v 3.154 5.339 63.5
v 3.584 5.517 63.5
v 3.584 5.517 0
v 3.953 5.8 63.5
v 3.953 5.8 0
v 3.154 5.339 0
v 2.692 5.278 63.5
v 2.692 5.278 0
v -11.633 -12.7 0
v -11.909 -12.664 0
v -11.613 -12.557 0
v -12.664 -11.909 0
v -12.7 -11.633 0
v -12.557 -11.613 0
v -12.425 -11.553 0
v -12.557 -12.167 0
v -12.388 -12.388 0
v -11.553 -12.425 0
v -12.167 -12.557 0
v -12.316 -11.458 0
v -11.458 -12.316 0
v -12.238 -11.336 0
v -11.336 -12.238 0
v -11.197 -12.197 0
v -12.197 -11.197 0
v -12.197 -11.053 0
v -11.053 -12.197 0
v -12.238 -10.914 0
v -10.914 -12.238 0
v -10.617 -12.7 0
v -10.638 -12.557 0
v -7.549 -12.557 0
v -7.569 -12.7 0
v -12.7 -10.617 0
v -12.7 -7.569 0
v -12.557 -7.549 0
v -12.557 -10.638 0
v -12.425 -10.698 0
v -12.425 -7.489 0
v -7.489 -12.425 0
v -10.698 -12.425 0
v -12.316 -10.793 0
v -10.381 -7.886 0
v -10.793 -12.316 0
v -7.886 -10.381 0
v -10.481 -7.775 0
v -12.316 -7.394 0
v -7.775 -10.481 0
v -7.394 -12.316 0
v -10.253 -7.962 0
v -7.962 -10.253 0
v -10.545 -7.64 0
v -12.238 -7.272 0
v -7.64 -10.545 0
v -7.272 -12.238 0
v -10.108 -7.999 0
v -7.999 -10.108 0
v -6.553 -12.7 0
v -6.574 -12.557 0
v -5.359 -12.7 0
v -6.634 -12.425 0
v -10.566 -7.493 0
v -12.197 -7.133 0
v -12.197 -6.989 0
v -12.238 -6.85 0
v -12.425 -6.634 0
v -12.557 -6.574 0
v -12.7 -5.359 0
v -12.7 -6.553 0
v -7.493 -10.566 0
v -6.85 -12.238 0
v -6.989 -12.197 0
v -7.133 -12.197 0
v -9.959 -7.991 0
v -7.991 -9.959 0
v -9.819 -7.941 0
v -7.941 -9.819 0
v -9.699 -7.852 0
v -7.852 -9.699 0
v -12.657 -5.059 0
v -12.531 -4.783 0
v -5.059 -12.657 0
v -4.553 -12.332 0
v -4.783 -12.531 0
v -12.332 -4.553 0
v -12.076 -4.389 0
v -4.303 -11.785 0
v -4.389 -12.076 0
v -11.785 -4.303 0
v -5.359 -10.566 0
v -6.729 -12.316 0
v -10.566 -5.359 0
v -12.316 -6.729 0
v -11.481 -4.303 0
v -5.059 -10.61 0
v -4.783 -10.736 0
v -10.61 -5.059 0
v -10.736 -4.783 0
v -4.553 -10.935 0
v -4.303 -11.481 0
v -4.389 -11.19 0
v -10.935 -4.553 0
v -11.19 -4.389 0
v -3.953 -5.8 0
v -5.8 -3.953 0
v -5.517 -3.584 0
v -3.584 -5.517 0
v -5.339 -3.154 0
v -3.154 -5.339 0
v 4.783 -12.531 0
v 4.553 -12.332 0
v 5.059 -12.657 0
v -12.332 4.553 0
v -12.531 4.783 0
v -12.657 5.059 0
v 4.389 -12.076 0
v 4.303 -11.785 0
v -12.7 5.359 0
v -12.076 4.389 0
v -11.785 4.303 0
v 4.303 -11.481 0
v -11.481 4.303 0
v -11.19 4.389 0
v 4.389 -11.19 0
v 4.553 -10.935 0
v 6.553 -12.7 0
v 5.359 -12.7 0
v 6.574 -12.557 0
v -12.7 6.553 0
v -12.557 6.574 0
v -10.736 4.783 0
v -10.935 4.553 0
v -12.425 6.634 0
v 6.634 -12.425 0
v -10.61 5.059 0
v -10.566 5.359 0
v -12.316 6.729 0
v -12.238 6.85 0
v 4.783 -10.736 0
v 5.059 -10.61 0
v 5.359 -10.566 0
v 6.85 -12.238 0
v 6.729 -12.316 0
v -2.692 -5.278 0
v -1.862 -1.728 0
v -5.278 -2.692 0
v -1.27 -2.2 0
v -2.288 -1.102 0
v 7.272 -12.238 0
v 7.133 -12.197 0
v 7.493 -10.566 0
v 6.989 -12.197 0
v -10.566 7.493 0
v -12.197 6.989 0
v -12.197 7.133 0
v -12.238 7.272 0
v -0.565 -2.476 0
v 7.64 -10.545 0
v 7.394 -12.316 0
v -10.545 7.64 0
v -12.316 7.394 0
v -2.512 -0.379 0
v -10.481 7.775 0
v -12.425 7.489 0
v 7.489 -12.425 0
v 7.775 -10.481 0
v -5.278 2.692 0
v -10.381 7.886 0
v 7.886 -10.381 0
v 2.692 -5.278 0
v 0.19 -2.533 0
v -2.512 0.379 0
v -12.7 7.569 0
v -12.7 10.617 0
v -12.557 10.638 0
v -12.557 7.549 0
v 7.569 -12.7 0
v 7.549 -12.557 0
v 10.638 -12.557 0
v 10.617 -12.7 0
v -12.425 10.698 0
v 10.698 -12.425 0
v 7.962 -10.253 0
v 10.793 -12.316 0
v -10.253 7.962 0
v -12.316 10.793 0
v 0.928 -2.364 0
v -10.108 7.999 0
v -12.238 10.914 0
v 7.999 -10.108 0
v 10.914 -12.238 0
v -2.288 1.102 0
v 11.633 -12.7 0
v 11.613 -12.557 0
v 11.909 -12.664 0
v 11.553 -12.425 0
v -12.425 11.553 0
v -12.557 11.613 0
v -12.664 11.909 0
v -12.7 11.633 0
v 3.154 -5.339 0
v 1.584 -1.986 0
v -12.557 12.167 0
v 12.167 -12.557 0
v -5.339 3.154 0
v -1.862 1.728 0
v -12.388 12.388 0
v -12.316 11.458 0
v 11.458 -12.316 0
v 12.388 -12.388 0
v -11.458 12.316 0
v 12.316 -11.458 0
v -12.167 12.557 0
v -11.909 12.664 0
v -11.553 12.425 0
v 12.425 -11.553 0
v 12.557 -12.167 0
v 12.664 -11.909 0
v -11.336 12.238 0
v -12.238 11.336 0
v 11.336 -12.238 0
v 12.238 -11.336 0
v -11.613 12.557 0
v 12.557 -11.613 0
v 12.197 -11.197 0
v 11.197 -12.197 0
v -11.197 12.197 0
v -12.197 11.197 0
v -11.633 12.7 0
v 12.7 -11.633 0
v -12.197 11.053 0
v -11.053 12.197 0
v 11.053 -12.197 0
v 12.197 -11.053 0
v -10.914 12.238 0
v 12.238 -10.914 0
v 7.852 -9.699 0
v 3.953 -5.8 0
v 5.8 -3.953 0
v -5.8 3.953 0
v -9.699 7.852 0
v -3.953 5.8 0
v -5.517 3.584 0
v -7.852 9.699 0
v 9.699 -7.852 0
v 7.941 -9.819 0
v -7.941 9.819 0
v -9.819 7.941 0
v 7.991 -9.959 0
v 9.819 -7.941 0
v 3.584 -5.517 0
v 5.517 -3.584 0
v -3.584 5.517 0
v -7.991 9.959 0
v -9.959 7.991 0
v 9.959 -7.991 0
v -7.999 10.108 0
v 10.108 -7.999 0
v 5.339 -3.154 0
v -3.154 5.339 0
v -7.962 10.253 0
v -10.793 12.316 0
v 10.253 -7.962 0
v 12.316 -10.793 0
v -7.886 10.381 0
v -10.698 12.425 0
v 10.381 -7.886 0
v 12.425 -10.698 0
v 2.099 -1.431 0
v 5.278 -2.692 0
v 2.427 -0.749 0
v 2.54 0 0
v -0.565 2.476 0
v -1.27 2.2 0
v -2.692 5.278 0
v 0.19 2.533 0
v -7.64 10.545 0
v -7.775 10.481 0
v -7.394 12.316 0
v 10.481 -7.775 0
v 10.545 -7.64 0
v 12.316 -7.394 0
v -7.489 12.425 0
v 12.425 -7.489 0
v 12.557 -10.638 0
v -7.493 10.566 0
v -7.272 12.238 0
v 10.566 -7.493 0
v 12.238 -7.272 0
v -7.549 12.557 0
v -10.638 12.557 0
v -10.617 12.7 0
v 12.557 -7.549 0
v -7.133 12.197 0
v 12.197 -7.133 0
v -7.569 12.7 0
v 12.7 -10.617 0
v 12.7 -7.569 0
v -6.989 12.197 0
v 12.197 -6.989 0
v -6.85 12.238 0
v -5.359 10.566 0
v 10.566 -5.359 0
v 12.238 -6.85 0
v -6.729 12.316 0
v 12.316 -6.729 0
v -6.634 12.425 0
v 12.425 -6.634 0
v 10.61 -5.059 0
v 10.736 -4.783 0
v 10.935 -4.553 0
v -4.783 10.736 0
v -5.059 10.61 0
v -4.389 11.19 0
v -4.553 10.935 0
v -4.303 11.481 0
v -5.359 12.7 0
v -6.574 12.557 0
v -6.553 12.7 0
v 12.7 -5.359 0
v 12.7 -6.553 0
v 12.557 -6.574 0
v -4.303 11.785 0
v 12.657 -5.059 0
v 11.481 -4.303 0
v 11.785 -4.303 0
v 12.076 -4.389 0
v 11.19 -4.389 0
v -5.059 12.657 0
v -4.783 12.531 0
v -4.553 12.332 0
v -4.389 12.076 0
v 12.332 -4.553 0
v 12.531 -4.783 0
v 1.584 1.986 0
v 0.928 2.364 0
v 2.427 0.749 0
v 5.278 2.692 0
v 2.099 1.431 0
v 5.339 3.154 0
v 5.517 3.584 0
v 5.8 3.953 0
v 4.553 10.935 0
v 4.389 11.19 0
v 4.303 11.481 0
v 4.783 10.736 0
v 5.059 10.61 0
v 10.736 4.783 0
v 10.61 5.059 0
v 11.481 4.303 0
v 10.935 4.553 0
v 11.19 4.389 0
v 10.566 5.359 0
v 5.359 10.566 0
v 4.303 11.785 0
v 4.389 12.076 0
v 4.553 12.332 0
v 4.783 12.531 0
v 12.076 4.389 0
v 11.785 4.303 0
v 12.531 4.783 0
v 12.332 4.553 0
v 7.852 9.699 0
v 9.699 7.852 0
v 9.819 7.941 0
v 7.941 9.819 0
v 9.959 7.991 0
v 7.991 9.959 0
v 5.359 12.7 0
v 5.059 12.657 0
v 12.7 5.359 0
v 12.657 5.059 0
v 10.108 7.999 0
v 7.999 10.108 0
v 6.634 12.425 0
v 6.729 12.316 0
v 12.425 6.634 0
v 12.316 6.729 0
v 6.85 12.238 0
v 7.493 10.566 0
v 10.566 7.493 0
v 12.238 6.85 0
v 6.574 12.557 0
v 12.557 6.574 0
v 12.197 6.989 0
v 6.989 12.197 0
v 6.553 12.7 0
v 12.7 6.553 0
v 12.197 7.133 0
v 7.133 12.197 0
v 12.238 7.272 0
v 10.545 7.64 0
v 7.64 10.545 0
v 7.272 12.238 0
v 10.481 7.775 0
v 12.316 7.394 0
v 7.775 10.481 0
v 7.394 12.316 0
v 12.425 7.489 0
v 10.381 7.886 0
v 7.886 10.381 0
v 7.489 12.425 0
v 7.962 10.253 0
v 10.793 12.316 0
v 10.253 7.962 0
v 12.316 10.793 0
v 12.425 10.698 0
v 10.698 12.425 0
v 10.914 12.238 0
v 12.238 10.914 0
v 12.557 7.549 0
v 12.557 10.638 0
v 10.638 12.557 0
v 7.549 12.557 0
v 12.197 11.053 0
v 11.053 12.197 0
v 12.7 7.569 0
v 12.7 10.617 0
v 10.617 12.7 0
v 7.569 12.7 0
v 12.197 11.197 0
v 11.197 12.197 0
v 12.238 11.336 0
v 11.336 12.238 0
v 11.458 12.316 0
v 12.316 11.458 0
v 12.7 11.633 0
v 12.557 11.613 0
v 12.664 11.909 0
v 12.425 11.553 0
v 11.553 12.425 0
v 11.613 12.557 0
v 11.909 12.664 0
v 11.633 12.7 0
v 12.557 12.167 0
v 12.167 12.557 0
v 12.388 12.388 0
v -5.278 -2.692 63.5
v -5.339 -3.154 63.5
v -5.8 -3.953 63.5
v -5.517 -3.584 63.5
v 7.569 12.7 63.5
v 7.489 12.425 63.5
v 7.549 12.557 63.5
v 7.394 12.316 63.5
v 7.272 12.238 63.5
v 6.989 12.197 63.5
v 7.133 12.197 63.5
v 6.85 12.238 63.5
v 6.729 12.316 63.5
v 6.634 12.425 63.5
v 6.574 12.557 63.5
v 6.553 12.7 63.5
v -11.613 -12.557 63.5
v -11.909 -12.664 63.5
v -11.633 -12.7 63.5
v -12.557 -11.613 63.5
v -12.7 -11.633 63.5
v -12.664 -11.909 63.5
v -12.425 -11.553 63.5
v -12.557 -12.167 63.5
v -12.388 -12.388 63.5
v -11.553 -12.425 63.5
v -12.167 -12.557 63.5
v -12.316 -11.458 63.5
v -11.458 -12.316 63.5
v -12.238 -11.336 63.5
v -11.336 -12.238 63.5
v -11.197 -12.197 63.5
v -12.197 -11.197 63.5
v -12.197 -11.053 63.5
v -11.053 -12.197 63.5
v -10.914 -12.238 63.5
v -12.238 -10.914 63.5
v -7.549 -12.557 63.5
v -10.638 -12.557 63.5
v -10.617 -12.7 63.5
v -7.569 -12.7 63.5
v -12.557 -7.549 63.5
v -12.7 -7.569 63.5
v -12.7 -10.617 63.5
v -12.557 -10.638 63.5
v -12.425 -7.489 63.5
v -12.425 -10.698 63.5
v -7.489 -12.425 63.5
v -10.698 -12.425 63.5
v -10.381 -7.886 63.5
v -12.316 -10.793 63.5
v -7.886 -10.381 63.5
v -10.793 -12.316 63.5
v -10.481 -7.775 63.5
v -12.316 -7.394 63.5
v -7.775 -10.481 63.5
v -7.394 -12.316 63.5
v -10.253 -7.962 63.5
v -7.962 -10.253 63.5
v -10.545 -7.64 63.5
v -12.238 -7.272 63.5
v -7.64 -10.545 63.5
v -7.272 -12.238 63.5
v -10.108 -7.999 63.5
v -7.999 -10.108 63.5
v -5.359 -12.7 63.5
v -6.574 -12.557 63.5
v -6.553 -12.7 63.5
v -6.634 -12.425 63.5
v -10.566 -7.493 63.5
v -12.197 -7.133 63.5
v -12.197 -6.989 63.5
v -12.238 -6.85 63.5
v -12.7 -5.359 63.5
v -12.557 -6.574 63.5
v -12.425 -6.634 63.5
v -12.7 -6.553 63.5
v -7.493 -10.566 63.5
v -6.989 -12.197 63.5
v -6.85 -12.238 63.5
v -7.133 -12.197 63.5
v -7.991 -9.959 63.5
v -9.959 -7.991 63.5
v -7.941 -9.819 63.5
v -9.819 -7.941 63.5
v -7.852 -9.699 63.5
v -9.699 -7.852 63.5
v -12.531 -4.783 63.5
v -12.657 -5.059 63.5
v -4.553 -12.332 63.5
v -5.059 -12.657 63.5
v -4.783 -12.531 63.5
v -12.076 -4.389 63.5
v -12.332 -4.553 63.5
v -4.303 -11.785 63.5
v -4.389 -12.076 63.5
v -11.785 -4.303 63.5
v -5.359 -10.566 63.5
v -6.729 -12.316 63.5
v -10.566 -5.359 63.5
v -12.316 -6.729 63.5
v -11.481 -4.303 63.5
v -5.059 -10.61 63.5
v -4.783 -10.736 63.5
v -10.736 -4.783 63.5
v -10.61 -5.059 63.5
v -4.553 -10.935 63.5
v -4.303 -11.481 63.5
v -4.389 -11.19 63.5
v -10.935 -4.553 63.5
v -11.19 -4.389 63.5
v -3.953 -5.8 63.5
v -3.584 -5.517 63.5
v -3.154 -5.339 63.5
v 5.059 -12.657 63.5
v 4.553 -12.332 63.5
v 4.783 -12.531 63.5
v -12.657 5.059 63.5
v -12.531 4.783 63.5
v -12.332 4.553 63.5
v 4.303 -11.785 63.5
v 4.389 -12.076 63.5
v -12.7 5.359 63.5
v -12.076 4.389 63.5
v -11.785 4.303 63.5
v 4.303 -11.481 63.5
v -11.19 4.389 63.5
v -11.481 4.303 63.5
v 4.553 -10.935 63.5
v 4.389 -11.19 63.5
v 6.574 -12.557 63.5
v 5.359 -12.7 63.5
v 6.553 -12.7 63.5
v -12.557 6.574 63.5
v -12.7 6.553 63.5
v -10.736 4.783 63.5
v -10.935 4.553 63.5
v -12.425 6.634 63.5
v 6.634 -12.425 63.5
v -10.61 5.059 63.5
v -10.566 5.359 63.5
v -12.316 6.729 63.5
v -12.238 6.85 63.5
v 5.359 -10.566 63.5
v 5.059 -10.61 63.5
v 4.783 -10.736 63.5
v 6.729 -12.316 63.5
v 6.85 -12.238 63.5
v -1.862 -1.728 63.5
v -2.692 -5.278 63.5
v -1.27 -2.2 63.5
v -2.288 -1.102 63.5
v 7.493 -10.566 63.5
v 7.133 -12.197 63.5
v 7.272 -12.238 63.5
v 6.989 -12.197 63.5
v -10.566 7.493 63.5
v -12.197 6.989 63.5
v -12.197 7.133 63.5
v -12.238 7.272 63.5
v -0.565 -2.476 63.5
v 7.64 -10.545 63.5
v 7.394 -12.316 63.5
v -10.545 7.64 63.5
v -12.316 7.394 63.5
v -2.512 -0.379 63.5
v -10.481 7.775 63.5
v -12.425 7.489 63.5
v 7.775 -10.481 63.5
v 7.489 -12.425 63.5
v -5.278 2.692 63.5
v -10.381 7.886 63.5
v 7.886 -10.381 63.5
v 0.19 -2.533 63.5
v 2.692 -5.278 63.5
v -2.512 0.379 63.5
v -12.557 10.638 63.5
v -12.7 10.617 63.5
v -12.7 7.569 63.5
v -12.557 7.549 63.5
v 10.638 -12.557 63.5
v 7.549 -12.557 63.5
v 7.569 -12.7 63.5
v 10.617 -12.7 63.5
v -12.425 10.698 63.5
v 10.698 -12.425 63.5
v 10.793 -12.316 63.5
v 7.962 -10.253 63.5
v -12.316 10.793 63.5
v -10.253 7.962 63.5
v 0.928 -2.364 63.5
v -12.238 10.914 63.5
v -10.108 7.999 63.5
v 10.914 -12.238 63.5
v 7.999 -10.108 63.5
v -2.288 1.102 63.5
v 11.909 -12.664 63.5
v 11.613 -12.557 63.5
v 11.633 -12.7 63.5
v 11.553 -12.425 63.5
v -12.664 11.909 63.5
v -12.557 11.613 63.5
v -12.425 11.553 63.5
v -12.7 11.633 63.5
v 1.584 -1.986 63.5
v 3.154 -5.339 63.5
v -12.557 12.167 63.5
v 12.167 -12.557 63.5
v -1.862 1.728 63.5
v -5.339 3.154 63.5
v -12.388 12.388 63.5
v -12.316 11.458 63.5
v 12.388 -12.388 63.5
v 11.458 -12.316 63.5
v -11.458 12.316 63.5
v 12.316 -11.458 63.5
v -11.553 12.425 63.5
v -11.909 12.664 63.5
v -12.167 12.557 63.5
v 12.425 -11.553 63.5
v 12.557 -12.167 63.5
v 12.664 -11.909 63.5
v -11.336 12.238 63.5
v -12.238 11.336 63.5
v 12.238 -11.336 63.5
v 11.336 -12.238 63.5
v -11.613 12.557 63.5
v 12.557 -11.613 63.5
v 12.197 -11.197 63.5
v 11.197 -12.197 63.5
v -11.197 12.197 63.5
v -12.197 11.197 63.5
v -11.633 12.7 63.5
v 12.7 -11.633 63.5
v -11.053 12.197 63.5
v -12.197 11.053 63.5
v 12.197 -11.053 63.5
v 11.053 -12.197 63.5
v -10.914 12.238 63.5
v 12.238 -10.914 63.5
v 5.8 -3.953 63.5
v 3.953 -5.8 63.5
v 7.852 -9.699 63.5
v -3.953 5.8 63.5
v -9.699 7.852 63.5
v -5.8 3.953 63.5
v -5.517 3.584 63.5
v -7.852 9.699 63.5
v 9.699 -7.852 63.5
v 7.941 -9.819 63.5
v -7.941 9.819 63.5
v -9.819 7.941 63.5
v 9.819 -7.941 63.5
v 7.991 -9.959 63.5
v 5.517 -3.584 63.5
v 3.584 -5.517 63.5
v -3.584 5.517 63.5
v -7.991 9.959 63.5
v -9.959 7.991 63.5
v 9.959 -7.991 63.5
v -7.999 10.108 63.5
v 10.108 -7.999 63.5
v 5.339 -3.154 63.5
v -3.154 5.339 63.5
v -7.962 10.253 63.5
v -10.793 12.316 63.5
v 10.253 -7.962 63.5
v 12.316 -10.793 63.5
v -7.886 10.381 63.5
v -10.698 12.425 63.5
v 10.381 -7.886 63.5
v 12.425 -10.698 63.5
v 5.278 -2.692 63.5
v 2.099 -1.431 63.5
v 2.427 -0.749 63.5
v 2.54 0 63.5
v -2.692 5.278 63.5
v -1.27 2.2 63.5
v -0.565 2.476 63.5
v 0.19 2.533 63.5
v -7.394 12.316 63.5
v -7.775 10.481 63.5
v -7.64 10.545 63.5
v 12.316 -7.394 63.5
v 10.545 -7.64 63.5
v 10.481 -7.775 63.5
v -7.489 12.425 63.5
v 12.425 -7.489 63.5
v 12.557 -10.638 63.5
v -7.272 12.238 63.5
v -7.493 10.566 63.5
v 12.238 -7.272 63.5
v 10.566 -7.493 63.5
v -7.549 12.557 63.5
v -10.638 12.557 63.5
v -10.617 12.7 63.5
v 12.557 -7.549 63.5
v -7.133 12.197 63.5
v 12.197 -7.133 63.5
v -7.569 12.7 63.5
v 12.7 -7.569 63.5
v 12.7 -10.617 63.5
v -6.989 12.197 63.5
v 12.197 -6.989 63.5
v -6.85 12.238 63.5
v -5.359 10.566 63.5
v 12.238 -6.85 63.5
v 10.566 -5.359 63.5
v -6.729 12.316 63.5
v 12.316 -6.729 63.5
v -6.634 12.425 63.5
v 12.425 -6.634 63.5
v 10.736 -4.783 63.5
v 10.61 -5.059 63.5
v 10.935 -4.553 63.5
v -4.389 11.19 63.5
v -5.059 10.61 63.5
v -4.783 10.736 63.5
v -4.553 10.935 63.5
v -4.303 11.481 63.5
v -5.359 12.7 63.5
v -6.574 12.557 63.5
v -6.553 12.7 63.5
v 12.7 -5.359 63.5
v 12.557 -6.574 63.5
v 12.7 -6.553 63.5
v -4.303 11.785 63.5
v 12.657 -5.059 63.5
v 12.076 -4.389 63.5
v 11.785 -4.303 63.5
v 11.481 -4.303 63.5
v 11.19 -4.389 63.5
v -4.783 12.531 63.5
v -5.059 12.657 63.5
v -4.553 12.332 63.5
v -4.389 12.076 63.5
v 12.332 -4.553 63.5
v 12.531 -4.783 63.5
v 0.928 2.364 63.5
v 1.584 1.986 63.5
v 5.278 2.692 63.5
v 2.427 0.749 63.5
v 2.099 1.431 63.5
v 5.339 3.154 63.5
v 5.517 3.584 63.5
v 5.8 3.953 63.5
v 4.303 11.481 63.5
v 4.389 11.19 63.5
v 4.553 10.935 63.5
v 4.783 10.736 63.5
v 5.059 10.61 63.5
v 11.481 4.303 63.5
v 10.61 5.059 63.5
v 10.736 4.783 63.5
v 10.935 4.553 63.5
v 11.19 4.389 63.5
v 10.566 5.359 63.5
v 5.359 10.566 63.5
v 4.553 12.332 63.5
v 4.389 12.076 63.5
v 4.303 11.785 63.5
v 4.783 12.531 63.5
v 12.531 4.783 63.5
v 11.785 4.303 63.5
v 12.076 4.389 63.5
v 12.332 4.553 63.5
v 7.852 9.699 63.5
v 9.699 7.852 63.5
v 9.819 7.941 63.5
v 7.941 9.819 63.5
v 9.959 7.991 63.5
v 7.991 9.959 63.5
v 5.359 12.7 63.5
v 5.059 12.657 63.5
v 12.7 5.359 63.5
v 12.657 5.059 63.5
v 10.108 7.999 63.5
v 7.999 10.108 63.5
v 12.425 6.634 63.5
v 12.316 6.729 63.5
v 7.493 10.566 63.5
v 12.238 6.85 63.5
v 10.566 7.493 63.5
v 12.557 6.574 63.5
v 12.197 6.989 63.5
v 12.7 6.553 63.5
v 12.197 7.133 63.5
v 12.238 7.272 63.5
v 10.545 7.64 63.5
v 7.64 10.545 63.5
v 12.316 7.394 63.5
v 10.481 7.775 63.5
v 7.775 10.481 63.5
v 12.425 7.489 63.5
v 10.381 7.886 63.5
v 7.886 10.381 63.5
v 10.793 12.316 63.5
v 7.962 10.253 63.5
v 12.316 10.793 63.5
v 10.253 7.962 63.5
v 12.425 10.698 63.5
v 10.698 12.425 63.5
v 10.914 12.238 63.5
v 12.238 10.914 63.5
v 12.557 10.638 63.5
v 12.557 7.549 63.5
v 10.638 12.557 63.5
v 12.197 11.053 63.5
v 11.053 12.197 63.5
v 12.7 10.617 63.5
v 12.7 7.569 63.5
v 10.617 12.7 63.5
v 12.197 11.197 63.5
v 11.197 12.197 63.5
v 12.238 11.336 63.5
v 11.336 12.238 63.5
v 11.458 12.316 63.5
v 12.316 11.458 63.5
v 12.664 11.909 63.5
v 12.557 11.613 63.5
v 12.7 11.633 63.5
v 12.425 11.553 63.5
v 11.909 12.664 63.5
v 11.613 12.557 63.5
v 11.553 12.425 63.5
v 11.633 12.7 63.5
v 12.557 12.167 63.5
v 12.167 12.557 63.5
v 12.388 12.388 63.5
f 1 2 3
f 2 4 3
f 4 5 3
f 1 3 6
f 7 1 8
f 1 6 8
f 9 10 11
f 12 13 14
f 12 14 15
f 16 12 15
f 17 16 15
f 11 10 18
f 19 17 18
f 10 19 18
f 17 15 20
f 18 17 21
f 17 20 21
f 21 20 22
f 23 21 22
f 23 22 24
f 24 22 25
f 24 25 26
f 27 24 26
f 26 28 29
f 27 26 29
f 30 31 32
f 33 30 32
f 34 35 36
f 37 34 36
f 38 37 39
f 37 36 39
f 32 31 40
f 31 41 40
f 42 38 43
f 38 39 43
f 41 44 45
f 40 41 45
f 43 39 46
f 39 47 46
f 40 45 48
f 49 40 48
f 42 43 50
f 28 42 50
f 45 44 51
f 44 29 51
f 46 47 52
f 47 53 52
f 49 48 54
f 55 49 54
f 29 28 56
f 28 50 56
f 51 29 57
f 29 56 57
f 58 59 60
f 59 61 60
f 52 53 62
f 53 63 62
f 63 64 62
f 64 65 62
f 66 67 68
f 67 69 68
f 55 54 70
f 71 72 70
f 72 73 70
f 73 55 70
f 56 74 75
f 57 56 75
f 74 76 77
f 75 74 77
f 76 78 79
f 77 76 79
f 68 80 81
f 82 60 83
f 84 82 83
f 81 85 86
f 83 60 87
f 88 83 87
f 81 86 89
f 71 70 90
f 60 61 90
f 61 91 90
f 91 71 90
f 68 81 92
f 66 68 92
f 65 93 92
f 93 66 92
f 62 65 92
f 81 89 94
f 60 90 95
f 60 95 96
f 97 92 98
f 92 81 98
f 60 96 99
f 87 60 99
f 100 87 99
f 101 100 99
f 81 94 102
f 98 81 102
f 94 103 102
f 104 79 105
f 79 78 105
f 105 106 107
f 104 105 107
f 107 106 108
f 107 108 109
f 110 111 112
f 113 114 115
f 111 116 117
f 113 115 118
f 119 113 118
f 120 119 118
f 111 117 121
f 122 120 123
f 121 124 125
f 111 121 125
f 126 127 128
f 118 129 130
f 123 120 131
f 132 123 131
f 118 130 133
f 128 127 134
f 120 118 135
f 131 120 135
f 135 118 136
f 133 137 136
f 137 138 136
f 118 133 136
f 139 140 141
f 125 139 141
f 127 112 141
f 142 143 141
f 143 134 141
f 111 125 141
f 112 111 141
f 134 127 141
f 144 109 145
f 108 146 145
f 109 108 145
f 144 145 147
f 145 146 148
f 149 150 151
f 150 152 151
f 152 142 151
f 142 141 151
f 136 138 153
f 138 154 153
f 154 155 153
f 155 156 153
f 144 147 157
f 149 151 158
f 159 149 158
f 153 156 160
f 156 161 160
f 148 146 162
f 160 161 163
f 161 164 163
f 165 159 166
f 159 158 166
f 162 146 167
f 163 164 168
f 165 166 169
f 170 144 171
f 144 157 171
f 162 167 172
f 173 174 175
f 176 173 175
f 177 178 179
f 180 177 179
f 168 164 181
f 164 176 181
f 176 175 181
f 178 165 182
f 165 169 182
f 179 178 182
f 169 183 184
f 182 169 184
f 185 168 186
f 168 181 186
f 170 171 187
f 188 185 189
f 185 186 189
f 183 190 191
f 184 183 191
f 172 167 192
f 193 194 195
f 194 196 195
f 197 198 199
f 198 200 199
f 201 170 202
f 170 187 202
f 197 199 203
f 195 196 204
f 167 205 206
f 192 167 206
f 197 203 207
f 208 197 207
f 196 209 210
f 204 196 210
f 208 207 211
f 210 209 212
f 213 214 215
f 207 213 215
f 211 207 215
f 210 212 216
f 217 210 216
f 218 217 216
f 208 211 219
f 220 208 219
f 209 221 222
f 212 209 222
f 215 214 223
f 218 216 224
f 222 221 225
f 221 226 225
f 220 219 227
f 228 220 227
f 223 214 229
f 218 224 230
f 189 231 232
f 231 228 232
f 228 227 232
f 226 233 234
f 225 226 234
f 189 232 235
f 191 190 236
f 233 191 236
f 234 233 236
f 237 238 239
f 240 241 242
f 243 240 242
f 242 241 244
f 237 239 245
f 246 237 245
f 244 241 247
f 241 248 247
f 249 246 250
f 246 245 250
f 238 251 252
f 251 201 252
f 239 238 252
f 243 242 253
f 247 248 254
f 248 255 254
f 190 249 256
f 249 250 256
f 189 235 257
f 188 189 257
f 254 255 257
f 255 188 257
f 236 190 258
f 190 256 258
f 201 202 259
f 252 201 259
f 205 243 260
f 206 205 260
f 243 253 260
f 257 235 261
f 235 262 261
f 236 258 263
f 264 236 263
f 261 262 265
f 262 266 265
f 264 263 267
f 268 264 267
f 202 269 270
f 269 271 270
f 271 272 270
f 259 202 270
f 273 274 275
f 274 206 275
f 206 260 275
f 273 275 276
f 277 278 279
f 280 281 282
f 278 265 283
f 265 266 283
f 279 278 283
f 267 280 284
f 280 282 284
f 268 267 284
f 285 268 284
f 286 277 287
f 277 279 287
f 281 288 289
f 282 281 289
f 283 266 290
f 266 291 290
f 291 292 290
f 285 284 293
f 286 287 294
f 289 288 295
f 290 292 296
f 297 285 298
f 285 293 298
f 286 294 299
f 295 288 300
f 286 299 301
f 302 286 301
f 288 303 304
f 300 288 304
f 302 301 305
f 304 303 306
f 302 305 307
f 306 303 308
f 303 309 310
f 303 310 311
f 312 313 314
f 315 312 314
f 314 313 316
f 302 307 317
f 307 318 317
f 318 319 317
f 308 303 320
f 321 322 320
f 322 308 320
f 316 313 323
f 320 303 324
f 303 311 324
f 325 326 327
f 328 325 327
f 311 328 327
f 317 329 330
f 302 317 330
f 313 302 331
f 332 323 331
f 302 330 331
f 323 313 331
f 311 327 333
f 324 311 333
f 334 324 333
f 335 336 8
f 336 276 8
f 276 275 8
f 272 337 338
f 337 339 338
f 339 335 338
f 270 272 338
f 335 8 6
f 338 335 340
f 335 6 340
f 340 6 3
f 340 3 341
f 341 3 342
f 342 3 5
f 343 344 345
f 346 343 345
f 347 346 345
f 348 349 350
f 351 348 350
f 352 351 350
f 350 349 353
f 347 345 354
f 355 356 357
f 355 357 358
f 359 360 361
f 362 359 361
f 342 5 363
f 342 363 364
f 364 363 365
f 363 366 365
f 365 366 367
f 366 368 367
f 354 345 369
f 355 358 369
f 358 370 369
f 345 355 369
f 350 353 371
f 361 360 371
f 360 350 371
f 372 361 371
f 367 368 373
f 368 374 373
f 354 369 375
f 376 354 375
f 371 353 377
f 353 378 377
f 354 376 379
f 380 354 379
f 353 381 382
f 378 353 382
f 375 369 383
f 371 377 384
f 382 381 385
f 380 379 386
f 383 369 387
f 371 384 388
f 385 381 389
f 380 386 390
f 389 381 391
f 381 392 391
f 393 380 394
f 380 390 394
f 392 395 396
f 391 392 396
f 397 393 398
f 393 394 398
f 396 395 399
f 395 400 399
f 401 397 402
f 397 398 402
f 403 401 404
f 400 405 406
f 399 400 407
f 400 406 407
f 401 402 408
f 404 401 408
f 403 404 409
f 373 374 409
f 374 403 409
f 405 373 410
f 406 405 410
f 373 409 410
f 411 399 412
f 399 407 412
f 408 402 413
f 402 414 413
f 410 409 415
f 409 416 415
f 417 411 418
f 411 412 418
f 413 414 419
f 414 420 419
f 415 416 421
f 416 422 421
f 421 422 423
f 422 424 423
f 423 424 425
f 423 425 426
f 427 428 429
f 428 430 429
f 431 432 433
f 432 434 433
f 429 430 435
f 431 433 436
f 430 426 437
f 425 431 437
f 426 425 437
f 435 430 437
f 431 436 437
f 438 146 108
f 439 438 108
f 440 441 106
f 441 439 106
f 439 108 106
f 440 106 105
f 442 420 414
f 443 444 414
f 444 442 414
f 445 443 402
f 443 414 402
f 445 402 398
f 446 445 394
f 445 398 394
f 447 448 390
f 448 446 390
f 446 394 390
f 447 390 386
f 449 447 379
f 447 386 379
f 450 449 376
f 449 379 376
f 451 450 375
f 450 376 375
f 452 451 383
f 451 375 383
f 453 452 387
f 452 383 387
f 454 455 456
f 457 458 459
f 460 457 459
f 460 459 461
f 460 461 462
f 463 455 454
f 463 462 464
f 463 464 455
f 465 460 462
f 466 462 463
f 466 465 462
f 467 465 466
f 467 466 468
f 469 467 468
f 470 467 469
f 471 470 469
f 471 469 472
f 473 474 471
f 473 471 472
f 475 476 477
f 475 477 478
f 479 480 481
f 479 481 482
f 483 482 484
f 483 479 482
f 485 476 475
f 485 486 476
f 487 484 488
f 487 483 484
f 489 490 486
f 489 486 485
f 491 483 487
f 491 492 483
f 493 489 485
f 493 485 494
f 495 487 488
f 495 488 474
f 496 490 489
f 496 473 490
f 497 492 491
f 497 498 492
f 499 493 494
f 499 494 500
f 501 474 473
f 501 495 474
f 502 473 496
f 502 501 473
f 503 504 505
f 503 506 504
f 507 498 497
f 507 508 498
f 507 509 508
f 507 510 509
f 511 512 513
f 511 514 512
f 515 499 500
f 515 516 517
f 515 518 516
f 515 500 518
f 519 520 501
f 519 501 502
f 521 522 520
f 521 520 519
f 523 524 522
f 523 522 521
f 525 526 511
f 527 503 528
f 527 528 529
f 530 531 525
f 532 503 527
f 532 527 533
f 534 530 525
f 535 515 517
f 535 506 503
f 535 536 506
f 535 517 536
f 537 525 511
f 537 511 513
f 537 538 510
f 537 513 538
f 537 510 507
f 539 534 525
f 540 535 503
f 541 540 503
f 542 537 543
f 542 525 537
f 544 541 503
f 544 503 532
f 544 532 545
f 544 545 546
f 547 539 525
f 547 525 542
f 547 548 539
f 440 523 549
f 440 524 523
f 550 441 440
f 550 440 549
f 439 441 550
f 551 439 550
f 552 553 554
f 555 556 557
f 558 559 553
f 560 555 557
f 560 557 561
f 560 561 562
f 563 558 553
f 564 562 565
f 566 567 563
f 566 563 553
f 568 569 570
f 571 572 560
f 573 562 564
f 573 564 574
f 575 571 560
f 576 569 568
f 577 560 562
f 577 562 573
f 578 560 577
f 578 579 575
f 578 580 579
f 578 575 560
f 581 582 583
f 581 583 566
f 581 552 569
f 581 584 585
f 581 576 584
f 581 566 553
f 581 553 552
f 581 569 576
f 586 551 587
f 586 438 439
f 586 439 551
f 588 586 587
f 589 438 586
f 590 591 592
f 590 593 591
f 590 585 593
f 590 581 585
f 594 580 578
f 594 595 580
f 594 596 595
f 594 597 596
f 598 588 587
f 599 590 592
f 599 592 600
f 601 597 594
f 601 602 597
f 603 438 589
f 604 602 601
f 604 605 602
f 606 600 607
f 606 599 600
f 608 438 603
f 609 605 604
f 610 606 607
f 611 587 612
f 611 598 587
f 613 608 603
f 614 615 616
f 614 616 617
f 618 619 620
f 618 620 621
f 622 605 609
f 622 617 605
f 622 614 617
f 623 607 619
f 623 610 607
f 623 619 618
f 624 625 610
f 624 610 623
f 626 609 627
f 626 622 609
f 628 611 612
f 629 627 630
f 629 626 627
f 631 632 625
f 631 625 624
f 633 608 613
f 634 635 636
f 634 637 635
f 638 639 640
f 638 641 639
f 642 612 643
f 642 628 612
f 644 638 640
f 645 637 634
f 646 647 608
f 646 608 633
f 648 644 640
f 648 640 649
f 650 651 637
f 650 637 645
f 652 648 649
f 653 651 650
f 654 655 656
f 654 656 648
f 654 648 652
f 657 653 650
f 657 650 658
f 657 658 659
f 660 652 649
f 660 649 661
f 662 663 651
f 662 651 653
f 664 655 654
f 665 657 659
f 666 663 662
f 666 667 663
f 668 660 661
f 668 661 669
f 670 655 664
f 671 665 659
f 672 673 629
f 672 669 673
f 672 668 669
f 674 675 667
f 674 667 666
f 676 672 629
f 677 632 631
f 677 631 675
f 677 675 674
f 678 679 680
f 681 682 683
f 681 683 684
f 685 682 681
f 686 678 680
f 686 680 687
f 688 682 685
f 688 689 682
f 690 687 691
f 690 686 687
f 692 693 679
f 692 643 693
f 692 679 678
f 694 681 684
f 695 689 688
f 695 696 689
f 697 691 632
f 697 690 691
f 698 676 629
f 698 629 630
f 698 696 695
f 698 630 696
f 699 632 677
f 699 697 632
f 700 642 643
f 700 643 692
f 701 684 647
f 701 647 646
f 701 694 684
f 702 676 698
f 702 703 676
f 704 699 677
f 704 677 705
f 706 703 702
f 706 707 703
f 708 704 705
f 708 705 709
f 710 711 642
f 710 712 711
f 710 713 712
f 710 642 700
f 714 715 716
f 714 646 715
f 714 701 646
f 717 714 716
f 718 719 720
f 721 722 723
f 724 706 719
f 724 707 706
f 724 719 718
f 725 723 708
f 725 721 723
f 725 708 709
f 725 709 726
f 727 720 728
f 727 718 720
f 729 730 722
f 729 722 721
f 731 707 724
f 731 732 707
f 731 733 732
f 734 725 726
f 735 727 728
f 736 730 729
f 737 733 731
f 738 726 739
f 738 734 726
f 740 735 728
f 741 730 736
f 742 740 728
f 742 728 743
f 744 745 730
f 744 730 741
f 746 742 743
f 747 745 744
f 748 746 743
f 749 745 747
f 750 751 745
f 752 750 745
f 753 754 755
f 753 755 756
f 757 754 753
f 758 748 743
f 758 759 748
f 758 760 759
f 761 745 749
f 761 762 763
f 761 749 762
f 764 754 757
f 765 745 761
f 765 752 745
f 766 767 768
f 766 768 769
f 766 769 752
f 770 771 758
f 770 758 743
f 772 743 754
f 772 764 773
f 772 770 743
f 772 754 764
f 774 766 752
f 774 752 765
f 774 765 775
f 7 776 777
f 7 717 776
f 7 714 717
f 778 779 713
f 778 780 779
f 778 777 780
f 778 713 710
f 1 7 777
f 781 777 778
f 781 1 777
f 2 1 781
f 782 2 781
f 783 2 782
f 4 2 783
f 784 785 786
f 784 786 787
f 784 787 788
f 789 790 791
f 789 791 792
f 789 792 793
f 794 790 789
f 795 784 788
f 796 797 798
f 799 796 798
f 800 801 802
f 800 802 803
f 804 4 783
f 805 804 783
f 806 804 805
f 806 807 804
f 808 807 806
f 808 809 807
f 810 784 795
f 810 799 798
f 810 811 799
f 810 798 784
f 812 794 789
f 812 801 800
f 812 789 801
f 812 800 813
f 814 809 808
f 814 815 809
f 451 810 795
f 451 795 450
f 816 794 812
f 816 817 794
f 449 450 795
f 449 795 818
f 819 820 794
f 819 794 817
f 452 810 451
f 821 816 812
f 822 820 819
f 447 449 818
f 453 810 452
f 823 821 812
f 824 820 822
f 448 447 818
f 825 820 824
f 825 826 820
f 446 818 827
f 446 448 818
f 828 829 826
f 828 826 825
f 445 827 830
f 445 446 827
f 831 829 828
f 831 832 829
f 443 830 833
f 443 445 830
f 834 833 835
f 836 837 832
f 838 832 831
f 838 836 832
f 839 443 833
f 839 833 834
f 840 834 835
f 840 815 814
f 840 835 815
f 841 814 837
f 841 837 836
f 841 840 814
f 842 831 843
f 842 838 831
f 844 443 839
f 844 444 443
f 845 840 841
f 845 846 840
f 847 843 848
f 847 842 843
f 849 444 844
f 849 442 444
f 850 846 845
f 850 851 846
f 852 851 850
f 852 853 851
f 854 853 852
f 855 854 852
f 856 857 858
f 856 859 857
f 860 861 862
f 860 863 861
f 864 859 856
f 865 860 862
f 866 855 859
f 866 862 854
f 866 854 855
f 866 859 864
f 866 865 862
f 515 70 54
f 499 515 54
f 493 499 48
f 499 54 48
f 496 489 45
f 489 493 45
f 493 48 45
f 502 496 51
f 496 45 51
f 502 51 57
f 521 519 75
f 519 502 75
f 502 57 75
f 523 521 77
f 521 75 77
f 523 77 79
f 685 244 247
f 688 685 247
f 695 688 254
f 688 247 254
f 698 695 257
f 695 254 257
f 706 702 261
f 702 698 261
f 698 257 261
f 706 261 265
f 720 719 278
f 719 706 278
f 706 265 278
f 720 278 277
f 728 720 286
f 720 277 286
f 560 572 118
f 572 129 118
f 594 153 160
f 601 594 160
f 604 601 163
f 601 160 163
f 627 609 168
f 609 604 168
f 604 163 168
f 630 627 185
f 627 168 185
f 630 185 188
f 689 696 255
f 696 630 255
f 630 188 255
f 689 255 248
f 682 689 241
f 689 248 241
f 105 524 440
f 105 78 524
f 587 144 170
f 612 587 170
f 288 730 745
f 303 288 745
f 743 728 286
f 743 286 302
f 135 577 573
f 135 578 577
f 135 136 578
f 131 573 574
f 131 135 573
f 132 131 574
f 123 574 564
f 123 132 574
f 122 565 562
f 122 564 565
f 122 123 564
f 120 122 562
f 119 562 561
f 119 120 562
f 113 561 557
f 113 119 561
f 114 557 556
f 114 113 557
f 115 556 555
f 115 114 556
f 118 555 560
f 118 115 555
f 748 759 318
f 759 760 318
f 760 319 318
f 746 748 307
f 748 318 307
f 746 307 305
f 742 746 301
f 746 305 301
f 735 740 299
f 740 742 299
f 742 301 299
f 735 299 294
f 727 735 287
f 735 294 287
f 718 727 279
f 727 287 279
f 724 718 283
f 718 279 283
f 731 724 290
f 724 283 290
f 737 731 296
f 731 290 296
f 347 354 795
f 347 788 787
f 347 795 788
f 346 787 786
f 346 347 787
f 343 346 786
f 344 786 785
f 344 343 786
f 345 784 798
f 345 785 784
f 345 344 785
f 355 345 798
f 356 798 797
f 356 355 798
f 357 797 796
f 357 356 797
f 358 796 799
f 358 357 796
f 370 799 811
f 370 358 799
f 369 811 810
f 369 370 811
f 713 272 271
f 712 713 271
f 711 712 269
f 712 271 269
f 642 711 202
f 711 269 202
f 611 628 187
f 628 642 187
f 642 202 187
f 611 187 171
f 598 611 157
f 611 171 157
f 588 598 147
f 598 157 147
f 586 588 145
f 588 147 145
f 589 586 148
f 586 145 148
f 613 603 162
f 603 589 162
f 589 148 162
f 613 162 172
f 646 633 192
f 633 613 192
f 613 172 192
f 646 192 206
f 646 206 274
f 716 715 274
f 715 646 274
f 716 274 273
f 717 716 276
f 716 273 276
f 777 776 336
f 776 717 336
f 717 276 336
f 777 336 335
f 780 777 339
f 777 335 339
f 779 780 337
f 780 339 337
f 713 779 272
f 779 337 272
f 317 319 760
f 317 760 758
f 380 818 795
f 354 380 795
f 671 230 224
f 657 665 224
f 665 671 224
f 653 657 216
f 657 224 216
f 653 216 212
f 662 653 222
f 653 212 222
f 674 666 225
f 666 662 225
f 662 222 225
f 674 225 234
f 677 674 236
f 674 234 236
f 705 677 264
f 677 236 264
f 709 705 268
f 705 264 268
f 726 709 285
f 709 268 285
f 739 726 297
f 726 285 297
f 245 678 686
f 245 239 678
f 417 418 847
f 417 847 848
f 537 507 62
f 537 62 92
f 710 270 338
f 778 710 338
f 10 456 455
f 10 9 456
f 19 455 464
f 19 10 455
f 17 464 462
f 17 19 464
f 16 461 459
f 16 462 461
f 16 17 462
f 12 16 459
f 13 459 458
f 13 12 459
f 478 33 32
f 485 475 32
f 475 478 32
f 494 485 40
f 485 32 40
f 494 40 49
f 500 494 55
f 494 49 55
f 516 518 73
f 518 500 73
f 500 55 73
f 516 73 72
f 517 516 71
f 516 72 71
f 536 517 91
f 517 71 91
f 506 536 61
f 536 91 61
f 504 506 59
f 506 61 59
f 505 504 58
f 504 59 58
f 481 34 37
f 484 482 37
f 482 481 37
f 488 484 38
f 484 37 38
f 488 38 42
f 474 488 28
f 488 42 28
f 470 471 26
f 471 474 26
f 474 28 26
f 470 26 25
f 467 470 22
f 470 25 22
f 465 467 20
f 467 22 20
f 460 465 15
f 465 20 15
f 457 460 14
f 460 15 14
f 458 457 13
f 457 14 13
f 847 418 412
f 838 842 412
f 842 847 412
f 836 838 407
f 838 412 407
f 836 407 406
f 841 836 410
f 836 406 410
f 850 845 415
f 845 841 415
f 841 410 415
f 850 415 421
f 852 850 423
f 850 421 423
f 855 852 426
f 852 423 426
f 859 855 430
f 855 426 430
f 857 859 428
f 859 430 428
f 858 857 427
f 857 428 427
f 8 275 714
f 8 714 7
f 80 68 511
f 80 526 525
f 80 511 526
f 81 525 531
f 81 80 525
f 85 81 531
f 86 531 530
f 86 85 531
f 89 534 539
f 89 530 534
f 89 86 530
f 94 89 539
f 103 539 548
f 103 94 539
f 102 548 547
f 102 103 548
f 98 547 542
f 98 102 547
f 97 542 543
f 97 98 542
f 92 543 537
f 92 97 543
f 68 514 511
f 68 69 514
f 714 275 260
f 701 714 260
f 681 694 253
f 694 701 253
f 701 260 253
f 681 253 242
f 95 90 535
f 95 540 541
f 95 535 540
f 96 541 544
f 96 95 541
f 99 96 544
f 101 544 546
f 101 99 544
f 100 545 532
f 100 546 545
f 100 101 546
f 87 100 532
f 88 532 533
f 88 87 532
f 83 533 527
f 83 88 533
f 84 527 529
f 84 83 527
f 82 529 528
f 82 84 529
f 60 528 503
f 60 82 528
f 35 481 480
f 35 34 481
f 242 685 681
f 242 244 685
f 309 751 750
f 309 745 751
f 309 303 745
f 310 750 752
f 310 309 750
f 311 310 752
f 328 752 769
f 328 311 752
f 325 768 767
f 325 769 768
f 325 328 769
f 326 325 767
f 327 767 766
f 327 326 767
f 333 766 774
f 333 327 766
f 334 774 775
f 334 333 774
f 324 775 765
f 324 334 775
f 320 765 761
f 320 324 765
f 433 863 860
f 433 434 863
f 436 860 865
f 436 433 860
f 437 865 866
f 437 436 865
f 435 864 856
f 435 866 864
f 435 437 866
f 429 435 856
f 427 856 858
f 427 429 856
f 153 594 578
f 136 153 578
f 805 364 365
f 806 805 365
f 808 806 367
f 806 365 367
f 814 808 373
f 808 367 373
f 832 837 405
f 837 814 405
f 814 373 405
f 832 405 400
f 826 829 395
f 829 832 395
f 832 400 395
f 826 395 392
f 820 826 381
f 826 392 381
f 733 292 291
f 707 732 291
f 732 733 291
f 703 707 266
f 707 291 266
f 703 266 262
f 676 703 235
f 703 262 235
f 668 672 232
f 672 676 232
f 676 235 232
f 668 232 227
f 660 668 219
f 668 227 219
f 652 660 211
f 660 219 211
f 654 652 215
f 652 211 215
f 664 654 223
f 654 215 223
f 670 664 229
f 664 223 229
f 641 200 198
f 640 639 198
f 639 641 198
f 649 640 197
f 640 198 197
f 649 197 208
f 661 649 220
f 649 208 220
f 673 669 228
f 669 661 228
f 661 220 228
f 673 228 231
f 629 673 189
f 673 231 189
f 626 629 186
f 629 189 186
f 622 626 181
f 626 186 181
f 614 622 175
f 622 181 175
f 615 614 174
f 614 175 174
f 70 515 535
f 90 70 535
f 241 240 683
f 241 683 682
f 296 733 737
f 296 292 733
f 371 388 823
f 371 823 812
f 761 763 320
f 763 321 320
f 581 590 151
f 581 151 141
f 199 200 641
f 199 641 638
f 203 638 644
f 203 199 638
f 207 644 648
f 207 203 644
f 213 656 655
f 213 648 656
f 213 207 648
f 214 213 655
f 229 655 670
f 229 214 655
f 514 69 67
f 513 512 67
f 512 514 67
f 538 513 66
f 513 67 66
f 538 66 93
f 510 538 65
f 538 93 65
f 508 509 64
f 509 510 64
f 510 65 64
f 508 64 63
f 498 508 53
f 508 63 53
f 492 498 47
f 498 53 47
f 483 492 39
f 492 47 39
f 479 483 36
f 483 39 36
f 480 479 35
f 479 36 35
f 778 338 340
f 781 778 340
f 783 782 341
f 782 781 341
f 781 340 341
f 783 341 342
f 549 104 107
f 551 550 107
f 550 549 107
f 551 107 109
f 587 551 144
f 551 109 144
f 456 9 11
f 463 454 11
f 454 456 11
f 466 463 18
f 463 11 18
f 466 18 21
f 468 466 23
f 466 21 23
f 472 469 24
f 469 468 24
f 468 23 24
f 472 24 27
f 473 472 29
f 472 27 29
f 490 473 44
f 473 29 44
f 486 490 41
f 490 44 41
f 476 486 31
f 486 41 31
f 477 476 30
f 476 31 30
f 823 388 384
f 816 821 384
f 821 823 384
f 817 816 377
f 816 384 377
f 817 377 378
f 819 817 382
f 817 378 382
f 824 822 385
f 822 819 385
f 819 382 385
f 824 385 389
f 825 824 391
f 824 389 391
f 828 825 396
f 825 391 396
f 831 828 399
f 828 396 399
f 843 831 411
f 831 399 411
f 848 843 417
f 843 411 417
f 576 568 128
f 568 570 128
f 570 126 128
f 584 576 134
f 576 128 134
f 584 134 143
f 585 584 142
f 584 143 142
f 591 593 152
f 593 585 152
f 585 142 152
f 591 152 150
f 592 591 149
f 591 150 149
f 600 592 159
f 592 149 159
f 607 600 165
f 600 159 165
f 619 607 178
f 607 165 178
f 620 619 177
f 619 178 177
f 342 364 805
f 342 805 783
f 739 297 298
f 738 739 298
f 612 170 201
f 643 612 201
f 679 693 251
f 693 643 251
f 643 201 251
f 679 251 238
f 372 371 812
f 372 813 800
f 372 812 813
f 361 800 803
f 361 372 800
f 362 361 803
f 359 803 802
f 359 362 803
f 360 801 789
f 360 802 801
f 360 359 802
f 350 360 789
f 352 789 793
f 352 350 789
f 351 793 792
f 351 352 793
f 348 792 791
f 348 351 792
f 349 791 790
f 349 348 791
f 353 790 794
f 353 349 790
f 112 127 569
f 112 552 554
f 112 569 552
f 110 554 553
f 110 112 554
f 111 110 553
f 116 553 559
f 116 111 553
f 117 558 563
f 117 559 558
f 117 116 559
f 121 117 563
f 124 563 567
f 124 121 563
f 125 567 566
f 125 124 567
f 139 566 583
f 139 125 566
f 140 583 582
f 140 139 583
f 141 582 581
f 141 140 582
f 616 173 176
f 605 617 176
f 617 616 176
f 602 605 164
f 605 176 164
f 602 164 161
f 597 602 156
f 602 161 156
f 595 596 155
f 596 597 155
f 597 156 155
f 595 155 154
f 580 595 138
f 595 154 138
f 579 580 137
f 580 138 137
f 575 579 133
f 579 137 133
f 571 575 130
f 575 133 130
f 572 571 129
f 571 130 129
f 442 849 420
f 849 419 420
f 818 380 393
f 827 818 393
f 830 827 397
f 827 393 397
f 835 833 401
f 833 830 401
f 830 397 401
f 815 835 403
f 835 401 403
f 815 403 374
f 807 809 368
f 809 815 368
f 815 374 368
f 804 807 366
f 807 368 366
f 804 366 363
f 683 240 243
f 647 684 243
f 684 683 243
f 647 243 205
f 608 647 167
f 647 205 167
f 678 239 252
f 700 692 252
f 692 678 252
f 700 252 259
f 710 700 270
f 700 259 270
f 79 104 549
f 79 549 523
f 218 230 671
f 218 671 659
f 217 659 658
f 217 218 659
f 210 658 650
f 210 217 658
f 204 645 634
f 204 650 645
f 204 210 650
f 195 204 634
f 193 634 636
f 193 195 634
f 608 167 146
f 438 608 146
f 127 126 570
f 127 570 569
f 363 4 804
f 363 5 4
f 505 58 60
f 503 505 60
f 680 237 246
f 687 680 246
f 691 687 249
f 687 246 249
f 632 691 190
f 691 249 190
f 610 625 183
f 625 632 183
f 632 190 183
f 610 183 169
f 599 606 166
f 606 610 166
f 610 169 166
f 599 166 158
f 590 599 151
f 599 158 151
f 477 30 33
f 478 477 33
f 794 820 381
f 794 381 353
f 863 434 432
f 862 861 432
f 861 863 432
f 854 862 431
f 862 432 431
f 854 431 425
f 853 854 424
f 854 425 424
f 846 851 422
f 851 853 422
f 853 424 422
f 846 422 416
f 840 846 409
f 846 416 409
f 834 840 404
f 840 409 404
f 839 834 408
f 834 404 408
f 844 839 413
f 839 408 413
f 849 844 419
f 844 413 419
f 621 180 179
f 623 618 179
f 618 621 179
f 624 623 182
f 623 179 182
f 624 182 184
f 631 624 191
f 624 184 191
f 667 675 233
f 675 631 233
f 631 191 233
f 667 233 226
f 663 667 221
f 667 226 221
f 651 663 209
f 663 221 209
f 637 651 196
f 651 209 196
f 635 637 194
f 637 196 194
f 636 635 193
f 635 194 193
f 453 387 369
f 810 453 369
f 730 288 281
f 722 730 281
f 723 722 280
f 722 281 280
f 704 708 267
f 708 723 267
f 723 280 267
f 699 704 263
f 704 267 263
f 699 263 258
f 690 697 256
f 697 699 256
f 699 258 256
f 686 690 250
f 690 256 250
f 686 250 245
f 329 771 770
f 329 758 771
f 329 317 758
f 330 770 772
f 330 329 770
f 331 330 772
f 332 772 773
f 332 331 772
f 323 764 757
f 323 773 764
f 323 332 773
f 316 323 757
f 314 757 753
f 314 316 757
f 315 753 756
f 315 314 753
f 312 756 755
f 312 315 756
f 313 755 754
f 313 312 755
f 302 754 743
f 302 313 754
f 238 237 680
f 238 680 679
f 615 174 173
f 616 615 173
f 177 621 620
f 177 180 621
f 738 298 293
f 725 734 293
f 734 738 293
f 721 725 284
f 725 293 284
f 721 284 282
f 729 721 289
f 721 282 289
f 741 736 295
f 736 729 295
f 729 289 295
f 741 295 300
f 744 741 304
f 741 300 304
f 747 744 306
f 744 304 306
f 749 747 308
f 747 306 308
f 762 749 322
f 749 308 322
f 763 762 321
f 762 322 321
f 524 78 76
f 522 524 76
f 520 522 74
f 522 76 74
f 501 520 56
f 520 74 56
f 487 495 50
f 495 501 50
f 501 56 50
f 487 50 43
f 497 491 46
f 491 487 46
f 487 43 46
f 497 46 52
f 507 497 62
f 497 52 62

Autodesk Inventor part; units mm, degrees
ref_plane "YZ Plane" through (0, 0, 0) normal (1, 0, 0) x (0, 1, 0)
ref_plane "Start Plane" through (0, 0, 0) normal (0, 0, 1) x (1, 0, 0)
ref_plane "End Plane" through (0, 0, 63.5) normal (0, 0, 1) x (1, 0, 0)
sketch "Sketch" plane through (0, 0, 0) normal (0, 0, 1) x (1, 0, 0)
  arc A0 (-11.6332, 12.7) -> (-12.7, 11.6332) centre (-11.6332, 11.6332) ccw
  arc A1 (-5.3594, 10.5664) -> (-5.3594, 12.7) centre (-5.3594, 11.6332) ccw
  arc A2 (-12.7, 5.3594) -> (-10.5664, 5.3594) centre (-11.6332, 5.3594) ccw
  line L0 (-10.5664, 7.493) -> (-10.5664, 5.3594)
  line L1 (-7.493, 10.5664) -> (-5.3594, 10.5664)
  arc A3 (-9.6992, 7.8522) -> (-10.5664, 7.493) centre (-10.0584, 7.493) ccw
  arc A4 (-7.493, 10.5664) -> (-7.8522, 9.6992) centre (-7.493, 10.0584) ccw
  line L2 (-11.6332, 11.6332) -> (0, 0) construction
  line L3 (-5.8003, 3.9533) -> (-9.6992, 7.8522)
  line L4 (-7.8522, 9.6992) -> (-3.9533, 5.8003)
  arc A5 (-3.9533, 5.8003) -> (-2.6924, 5.278) centre (-2.6924, 7.0612) ccw
  arc A6 (-5.278, 2.6924) -> (-5.8003, 3.9533) centre (-7.0612, 2.6924) ccw
  arc A7 (0, 2.54) -> (-2.54, 0) centre (0, 0) ccw construction
  line L5 (0, 0) -> (-12.7, 0) construction
  line L6 (0, 12.7) -> (0, 0) construction
  arc A8 (-11.6332, 12.7) -> (-10.6172, 12.7) centre (-11.1252, 12.7) ccw
  arc A9 (-7.5692, 12.7) -> (-6.5532, 12.7) centre (-7.0612, 12.7) ccw
  arc A10 (-12.7, 10.6172) -> (-12.7, 11.6332) centre (-12.7, 11.1252) ccw
  arc A11 (-12.7, 6.5532) -> (-12.7, 7.5692) centre (-12.7, 7.0612) ccw
  line L7 (-12.7, 10.6172) -> (-12.7, 7.5692)
  line L8 (-12.7, 6.5532) -> (-12.7, 5.3594)
  line L9 (-10.6172, 12.7) -> (-7.5692, 12.7)
  line L10 (-6.5532, 12.7) -> (-5.3594, 12.7)
  circle A12 centre (0, 0) radius 2.54
  arc A13 (-12.7, -11.6332) -> (-11.6332, -12.7) centre (-11.6332, -11.6332) ccw
  line L11 (-12.7, -10.6172) -> (-12.7, -7.5692)
  arc A14 (-10.5664, -7.493) -> (-9.6992, -7.8522) centre (-10.0584, -7.493) ccw
  line L12 (-9.6992, -7.8522) -> (-5.8003, -3.9533)
  line L13 (-11.6332, -11.6332) -> (0, 0) construction
  line L14 (-3.9533, -5.8003) -> (-7.8522, -9.6992)
  arc A15 (-7.8522, -9.6992) -> (-7.493, -10.5664) centre (-7.493, -10.0584) ccw
  line L15 (-10.6172, -12.7) -> (-7.5692, -12.7)
  line L16 (-7.493, -10.5664) -> (-5.3594, -10.5664)
  arc A16 (-6.5532, -12.7) -> (-7.5692, -12.7) centre (-7.0612, -12.7) ccw
  line L17 (-6.5532, -12.7) -> (-5.3594, -12.7)
  arc A17 (-5.3594, -12.7) -> (-5.3594, -10.5664) centre (-5.3594, -11.6332) ccw
  arc A18 (-10.6172, -12.7) -> (-11.6332, -12.7) centre (-11.1252, -12.7) ccw
  arc A19 (-12.7, -11.6332) -> (-12.7, -10.6172) centre (-12.7, -11.1252) ccw
  arc A20 (-2.6924, -5.278) -> (-3.9533, -5.8003) centre (-2.6924, -7.0612) ccw
  arc A21 (-5.8003, -3.9533) -> (-5.278, -2.6924) centre (-7.0612, -2.6924) ccw
  line L18 (-10.5664, -7.493) -> (-10.5664, -5.3594)
  line L19 (-12.7, -6.5532) -> (-12.7, -5.3594)
  arc A22 (-10.5664, -5.3594) -> (-12.7, -5.3594) centre (-11.6332, -5.3594) ccw
  arc A23 (-12.7, -7.5692) -> (-12.7, -6.5532) centre (-12.7, -7.0612) ccw
  arc A24 (11.6332, -12.7) -> (12.7, -11.6332) centre (11.6332, -11.6332) ccw
  line L20 (10.6172, -12.7) -> (7.5692, -12.7)
  arc A25 (7.493, -10.5664) -> (7.8522, -9.6992) centre (7.493, -10.0584) ccw
  line L21 (7.8522, -9.6992) -> (3.9533, -5.8003)
  line L22 (11.6332, -11.6332) -> (0, 0) construction
  line L23 (5.8003, -3.9533) -> (9.6992, -7.8522)
  arc A26 (9.6992, -7.8522) -> (10.5664, -7.493) centre (10.0584, -7.493) ccw
  line L24 (12.7, -10.6172) -> (12.7, -7.5692)
  line L25 (10.5664, -7.493) -> (10.5664, -5.3594)
  arc A27 (12.7, -6.5532) -> (12.7, -7.5692) centre (12.7, -7.0612) ccw
  line L26 (12.7, -6.5532) -> (12.7, -5.3594)
  arc A28 (12.7, -5.3594) -> (10.5664, -5.3594) centre (11.6332, -5.3594) ccw
  arc A29 (12.7, -10.6172) -> (12.7, -11.6332) centre (12.7, -11.1252) ccw
  arc A30 (11.6332, -12.7) -> (10.6172, -12.7) centre (11.1252, -12.7) ccw
  arc A31 (5.278, -2.6924) -> (5.8003, -3.9533) centre (7.0612, -2.6924) ccw
  arc A32 (3.9533, -5.8003) -> (2.6924, -5.278) centre (2.6924, -7.0612) ccw
  line L27 (7.493, -10.5664) -> (5.3594, -10.5664)
  line L28 (6.5532, -12.7) -> (5.3594, -12.7)
  arc A33 (5.3594, -10.5664) -> (5.3594, -12.7) centre (5.3594, -11.6332) ccw
  arc A34 (7.5692, -12.7) -> (6.5532, -12.7) centre (7.0612, -12.7) ccw
  arc A35 (12.7, 11.6332) -> (11.6332, 12.7) centre (11.6332, 11.6332) ccw
  line L29 (12.7, 10.6172) -> (12.7, 7.5692)
  arc A36 (10.5664, 7.493) -> (9.6992, 7.8522) centre (10.0584, 7.493) ccw
  line L30 (9.6992, 7.8522) -> (5.8003, 3.9533)
  line L31 (11.6332, 11.6332) -> (0, 0) construction
  line L32 (3.9533, 5.8003) -> (7.8522, 9.6992)
  arc A37 (7.8522, 9.6992) -> (7.493, 10.5664) centre (7.493, 10.0584) ccw
  line L33 (10.6172, 12.7) -> (7.5692, 12.7)
  line L34 (7.493, 10.5664) -> (5.3594, 10.5664)
  arc A38 (6.5532, 12.7) -> (7.5692, 12.7) centre (7.0612, 12.7) ccw
  line L35 (6.5532, 12.7) -> (5.3594, 12.7)
  arc A39 (5.3594, 12.7) -> (5.3594, 10.5664) centre (5.3594, 11.6332) ccw
  arc A40 (10.6172, 12.7) -> (11.6332, 12.7) centre (11.1252, 12.7) ccw
  arc A41 (12.7, 11.6332) -> (12.7, 10.6172) centre (12.7, 11.1252) ccw
  arc A42 (2.6924, 5.278) -> (3.9533, 5.8003) centre (2.6924, 7.0612) ccw
  arc A43 (5.8003, 3.9533) -> (5.278, 2.6924) centre (7.0612, 2.6924) ccw
  line L36 (10.5664, 7.493) -> (10.5664, 5.3594)
  line L37 (12.7, 6.5532) -> (12.7, 5.3594)
  arc A44 (10.5664, 5.3594) -> (12.7, 5.3594) centre (11.6332, 5.3594) ccw
  arc A45 (12.7, 7.5692) -> (12.7, 6.5532) centre (12.7, 7.0612) ccw
  line L38 (-2.6924, 5.278) -> (2.6924, 5.278)
  line L39 (-5.278, 2.6924) -> (-5.278, -2.6924)
  line L40 (-2.6924, -5.278) -> (2.6924, -5.278)
  line L41 (5.278, -2.6924) -> (5.278, 2.6924)
  point P0 (0, 0)
  point P1 (0, 0)
  dimension "d2" = 2.1336
  dimension "d3" = 6.2738
  dimension "d4" = 6.2738
  dimension "d5" = 1.0668
  dimension "d6" = 2.1336
  dimension "d7" = 2.1336
  dimension "d8" = 1.016
  dimension "d9" = 1.016
  dimension "d10" = 135
  dimension "d11" = 2.667
  dimension "d12" = 4.572
  dimension "d13" = 4.572
  dimension "d14" = 2.667
  dimension "d15" = 5.08
  dimension "d16" = 45
  dimension "d19" = 45
  dimension "d20" = 0.508
  dimension "d21" = 4.572
  dimension "d22" = 1.016
  dimension "d23" = 4.572
  dimension "d24" = 1.016
  dimension "d25" = 0.508
  dimension "d26" = 0.508
  dimension "d27" = 0.508
  dimension "d28" = 12.7
  dimension "d37" = 360
  dimension "d47" = 10.5664
  dimension "d48" = 12.7
extrude "Body" add sketch "Sketch" along normal up to surface (63.5 mm away) from surface at 0
sketch "Sketch4" plane through (0, 0, 0) normal (0, 0, 1) x (1, 0, 0)
  line L0 (0, 0) -> (10, 0)
ref_plane "Work Plane4" through (0, 0, 0) normal (0, -1, 0) x (1, 0, 0)
sketch "Sketch5" plane through (0, 0, 0) normal (0, -1, 0) x (1, 0, 0)
  line L0 (-2, 0) -> (12, 0)
  line L1 (-2, 63.5) -> (12, 63.5)
  dimension "d60" = 63.5
equation "\"d3\" = d4"
equation "\"d6\" = d7"
equation "\"d11\" = d14"
equation "\"d12\" = d13"
equation "\"d23\" = d21"
equation "\"d24\" = d30"
equation "\"d26\" = 0.5 * d24"
equation "\"d27\" = 0.5 * d22"
equation "\"Width\" = 2 * d28"
equation "\"Height\" = 2 * d48"
equation "\"G_OFFSET_START\" = 0"
equation "\"G_OFFSET_END\" = 0"
equation "\"d56\" = Length + G_OFFSET_END"
equation "\"G_L\" = 63.5"
equation "\"d30\" = 1.016"
equation "\"Length\" = 63.5"
properties part number "1010_80_20" material "Aluminum-6061"
